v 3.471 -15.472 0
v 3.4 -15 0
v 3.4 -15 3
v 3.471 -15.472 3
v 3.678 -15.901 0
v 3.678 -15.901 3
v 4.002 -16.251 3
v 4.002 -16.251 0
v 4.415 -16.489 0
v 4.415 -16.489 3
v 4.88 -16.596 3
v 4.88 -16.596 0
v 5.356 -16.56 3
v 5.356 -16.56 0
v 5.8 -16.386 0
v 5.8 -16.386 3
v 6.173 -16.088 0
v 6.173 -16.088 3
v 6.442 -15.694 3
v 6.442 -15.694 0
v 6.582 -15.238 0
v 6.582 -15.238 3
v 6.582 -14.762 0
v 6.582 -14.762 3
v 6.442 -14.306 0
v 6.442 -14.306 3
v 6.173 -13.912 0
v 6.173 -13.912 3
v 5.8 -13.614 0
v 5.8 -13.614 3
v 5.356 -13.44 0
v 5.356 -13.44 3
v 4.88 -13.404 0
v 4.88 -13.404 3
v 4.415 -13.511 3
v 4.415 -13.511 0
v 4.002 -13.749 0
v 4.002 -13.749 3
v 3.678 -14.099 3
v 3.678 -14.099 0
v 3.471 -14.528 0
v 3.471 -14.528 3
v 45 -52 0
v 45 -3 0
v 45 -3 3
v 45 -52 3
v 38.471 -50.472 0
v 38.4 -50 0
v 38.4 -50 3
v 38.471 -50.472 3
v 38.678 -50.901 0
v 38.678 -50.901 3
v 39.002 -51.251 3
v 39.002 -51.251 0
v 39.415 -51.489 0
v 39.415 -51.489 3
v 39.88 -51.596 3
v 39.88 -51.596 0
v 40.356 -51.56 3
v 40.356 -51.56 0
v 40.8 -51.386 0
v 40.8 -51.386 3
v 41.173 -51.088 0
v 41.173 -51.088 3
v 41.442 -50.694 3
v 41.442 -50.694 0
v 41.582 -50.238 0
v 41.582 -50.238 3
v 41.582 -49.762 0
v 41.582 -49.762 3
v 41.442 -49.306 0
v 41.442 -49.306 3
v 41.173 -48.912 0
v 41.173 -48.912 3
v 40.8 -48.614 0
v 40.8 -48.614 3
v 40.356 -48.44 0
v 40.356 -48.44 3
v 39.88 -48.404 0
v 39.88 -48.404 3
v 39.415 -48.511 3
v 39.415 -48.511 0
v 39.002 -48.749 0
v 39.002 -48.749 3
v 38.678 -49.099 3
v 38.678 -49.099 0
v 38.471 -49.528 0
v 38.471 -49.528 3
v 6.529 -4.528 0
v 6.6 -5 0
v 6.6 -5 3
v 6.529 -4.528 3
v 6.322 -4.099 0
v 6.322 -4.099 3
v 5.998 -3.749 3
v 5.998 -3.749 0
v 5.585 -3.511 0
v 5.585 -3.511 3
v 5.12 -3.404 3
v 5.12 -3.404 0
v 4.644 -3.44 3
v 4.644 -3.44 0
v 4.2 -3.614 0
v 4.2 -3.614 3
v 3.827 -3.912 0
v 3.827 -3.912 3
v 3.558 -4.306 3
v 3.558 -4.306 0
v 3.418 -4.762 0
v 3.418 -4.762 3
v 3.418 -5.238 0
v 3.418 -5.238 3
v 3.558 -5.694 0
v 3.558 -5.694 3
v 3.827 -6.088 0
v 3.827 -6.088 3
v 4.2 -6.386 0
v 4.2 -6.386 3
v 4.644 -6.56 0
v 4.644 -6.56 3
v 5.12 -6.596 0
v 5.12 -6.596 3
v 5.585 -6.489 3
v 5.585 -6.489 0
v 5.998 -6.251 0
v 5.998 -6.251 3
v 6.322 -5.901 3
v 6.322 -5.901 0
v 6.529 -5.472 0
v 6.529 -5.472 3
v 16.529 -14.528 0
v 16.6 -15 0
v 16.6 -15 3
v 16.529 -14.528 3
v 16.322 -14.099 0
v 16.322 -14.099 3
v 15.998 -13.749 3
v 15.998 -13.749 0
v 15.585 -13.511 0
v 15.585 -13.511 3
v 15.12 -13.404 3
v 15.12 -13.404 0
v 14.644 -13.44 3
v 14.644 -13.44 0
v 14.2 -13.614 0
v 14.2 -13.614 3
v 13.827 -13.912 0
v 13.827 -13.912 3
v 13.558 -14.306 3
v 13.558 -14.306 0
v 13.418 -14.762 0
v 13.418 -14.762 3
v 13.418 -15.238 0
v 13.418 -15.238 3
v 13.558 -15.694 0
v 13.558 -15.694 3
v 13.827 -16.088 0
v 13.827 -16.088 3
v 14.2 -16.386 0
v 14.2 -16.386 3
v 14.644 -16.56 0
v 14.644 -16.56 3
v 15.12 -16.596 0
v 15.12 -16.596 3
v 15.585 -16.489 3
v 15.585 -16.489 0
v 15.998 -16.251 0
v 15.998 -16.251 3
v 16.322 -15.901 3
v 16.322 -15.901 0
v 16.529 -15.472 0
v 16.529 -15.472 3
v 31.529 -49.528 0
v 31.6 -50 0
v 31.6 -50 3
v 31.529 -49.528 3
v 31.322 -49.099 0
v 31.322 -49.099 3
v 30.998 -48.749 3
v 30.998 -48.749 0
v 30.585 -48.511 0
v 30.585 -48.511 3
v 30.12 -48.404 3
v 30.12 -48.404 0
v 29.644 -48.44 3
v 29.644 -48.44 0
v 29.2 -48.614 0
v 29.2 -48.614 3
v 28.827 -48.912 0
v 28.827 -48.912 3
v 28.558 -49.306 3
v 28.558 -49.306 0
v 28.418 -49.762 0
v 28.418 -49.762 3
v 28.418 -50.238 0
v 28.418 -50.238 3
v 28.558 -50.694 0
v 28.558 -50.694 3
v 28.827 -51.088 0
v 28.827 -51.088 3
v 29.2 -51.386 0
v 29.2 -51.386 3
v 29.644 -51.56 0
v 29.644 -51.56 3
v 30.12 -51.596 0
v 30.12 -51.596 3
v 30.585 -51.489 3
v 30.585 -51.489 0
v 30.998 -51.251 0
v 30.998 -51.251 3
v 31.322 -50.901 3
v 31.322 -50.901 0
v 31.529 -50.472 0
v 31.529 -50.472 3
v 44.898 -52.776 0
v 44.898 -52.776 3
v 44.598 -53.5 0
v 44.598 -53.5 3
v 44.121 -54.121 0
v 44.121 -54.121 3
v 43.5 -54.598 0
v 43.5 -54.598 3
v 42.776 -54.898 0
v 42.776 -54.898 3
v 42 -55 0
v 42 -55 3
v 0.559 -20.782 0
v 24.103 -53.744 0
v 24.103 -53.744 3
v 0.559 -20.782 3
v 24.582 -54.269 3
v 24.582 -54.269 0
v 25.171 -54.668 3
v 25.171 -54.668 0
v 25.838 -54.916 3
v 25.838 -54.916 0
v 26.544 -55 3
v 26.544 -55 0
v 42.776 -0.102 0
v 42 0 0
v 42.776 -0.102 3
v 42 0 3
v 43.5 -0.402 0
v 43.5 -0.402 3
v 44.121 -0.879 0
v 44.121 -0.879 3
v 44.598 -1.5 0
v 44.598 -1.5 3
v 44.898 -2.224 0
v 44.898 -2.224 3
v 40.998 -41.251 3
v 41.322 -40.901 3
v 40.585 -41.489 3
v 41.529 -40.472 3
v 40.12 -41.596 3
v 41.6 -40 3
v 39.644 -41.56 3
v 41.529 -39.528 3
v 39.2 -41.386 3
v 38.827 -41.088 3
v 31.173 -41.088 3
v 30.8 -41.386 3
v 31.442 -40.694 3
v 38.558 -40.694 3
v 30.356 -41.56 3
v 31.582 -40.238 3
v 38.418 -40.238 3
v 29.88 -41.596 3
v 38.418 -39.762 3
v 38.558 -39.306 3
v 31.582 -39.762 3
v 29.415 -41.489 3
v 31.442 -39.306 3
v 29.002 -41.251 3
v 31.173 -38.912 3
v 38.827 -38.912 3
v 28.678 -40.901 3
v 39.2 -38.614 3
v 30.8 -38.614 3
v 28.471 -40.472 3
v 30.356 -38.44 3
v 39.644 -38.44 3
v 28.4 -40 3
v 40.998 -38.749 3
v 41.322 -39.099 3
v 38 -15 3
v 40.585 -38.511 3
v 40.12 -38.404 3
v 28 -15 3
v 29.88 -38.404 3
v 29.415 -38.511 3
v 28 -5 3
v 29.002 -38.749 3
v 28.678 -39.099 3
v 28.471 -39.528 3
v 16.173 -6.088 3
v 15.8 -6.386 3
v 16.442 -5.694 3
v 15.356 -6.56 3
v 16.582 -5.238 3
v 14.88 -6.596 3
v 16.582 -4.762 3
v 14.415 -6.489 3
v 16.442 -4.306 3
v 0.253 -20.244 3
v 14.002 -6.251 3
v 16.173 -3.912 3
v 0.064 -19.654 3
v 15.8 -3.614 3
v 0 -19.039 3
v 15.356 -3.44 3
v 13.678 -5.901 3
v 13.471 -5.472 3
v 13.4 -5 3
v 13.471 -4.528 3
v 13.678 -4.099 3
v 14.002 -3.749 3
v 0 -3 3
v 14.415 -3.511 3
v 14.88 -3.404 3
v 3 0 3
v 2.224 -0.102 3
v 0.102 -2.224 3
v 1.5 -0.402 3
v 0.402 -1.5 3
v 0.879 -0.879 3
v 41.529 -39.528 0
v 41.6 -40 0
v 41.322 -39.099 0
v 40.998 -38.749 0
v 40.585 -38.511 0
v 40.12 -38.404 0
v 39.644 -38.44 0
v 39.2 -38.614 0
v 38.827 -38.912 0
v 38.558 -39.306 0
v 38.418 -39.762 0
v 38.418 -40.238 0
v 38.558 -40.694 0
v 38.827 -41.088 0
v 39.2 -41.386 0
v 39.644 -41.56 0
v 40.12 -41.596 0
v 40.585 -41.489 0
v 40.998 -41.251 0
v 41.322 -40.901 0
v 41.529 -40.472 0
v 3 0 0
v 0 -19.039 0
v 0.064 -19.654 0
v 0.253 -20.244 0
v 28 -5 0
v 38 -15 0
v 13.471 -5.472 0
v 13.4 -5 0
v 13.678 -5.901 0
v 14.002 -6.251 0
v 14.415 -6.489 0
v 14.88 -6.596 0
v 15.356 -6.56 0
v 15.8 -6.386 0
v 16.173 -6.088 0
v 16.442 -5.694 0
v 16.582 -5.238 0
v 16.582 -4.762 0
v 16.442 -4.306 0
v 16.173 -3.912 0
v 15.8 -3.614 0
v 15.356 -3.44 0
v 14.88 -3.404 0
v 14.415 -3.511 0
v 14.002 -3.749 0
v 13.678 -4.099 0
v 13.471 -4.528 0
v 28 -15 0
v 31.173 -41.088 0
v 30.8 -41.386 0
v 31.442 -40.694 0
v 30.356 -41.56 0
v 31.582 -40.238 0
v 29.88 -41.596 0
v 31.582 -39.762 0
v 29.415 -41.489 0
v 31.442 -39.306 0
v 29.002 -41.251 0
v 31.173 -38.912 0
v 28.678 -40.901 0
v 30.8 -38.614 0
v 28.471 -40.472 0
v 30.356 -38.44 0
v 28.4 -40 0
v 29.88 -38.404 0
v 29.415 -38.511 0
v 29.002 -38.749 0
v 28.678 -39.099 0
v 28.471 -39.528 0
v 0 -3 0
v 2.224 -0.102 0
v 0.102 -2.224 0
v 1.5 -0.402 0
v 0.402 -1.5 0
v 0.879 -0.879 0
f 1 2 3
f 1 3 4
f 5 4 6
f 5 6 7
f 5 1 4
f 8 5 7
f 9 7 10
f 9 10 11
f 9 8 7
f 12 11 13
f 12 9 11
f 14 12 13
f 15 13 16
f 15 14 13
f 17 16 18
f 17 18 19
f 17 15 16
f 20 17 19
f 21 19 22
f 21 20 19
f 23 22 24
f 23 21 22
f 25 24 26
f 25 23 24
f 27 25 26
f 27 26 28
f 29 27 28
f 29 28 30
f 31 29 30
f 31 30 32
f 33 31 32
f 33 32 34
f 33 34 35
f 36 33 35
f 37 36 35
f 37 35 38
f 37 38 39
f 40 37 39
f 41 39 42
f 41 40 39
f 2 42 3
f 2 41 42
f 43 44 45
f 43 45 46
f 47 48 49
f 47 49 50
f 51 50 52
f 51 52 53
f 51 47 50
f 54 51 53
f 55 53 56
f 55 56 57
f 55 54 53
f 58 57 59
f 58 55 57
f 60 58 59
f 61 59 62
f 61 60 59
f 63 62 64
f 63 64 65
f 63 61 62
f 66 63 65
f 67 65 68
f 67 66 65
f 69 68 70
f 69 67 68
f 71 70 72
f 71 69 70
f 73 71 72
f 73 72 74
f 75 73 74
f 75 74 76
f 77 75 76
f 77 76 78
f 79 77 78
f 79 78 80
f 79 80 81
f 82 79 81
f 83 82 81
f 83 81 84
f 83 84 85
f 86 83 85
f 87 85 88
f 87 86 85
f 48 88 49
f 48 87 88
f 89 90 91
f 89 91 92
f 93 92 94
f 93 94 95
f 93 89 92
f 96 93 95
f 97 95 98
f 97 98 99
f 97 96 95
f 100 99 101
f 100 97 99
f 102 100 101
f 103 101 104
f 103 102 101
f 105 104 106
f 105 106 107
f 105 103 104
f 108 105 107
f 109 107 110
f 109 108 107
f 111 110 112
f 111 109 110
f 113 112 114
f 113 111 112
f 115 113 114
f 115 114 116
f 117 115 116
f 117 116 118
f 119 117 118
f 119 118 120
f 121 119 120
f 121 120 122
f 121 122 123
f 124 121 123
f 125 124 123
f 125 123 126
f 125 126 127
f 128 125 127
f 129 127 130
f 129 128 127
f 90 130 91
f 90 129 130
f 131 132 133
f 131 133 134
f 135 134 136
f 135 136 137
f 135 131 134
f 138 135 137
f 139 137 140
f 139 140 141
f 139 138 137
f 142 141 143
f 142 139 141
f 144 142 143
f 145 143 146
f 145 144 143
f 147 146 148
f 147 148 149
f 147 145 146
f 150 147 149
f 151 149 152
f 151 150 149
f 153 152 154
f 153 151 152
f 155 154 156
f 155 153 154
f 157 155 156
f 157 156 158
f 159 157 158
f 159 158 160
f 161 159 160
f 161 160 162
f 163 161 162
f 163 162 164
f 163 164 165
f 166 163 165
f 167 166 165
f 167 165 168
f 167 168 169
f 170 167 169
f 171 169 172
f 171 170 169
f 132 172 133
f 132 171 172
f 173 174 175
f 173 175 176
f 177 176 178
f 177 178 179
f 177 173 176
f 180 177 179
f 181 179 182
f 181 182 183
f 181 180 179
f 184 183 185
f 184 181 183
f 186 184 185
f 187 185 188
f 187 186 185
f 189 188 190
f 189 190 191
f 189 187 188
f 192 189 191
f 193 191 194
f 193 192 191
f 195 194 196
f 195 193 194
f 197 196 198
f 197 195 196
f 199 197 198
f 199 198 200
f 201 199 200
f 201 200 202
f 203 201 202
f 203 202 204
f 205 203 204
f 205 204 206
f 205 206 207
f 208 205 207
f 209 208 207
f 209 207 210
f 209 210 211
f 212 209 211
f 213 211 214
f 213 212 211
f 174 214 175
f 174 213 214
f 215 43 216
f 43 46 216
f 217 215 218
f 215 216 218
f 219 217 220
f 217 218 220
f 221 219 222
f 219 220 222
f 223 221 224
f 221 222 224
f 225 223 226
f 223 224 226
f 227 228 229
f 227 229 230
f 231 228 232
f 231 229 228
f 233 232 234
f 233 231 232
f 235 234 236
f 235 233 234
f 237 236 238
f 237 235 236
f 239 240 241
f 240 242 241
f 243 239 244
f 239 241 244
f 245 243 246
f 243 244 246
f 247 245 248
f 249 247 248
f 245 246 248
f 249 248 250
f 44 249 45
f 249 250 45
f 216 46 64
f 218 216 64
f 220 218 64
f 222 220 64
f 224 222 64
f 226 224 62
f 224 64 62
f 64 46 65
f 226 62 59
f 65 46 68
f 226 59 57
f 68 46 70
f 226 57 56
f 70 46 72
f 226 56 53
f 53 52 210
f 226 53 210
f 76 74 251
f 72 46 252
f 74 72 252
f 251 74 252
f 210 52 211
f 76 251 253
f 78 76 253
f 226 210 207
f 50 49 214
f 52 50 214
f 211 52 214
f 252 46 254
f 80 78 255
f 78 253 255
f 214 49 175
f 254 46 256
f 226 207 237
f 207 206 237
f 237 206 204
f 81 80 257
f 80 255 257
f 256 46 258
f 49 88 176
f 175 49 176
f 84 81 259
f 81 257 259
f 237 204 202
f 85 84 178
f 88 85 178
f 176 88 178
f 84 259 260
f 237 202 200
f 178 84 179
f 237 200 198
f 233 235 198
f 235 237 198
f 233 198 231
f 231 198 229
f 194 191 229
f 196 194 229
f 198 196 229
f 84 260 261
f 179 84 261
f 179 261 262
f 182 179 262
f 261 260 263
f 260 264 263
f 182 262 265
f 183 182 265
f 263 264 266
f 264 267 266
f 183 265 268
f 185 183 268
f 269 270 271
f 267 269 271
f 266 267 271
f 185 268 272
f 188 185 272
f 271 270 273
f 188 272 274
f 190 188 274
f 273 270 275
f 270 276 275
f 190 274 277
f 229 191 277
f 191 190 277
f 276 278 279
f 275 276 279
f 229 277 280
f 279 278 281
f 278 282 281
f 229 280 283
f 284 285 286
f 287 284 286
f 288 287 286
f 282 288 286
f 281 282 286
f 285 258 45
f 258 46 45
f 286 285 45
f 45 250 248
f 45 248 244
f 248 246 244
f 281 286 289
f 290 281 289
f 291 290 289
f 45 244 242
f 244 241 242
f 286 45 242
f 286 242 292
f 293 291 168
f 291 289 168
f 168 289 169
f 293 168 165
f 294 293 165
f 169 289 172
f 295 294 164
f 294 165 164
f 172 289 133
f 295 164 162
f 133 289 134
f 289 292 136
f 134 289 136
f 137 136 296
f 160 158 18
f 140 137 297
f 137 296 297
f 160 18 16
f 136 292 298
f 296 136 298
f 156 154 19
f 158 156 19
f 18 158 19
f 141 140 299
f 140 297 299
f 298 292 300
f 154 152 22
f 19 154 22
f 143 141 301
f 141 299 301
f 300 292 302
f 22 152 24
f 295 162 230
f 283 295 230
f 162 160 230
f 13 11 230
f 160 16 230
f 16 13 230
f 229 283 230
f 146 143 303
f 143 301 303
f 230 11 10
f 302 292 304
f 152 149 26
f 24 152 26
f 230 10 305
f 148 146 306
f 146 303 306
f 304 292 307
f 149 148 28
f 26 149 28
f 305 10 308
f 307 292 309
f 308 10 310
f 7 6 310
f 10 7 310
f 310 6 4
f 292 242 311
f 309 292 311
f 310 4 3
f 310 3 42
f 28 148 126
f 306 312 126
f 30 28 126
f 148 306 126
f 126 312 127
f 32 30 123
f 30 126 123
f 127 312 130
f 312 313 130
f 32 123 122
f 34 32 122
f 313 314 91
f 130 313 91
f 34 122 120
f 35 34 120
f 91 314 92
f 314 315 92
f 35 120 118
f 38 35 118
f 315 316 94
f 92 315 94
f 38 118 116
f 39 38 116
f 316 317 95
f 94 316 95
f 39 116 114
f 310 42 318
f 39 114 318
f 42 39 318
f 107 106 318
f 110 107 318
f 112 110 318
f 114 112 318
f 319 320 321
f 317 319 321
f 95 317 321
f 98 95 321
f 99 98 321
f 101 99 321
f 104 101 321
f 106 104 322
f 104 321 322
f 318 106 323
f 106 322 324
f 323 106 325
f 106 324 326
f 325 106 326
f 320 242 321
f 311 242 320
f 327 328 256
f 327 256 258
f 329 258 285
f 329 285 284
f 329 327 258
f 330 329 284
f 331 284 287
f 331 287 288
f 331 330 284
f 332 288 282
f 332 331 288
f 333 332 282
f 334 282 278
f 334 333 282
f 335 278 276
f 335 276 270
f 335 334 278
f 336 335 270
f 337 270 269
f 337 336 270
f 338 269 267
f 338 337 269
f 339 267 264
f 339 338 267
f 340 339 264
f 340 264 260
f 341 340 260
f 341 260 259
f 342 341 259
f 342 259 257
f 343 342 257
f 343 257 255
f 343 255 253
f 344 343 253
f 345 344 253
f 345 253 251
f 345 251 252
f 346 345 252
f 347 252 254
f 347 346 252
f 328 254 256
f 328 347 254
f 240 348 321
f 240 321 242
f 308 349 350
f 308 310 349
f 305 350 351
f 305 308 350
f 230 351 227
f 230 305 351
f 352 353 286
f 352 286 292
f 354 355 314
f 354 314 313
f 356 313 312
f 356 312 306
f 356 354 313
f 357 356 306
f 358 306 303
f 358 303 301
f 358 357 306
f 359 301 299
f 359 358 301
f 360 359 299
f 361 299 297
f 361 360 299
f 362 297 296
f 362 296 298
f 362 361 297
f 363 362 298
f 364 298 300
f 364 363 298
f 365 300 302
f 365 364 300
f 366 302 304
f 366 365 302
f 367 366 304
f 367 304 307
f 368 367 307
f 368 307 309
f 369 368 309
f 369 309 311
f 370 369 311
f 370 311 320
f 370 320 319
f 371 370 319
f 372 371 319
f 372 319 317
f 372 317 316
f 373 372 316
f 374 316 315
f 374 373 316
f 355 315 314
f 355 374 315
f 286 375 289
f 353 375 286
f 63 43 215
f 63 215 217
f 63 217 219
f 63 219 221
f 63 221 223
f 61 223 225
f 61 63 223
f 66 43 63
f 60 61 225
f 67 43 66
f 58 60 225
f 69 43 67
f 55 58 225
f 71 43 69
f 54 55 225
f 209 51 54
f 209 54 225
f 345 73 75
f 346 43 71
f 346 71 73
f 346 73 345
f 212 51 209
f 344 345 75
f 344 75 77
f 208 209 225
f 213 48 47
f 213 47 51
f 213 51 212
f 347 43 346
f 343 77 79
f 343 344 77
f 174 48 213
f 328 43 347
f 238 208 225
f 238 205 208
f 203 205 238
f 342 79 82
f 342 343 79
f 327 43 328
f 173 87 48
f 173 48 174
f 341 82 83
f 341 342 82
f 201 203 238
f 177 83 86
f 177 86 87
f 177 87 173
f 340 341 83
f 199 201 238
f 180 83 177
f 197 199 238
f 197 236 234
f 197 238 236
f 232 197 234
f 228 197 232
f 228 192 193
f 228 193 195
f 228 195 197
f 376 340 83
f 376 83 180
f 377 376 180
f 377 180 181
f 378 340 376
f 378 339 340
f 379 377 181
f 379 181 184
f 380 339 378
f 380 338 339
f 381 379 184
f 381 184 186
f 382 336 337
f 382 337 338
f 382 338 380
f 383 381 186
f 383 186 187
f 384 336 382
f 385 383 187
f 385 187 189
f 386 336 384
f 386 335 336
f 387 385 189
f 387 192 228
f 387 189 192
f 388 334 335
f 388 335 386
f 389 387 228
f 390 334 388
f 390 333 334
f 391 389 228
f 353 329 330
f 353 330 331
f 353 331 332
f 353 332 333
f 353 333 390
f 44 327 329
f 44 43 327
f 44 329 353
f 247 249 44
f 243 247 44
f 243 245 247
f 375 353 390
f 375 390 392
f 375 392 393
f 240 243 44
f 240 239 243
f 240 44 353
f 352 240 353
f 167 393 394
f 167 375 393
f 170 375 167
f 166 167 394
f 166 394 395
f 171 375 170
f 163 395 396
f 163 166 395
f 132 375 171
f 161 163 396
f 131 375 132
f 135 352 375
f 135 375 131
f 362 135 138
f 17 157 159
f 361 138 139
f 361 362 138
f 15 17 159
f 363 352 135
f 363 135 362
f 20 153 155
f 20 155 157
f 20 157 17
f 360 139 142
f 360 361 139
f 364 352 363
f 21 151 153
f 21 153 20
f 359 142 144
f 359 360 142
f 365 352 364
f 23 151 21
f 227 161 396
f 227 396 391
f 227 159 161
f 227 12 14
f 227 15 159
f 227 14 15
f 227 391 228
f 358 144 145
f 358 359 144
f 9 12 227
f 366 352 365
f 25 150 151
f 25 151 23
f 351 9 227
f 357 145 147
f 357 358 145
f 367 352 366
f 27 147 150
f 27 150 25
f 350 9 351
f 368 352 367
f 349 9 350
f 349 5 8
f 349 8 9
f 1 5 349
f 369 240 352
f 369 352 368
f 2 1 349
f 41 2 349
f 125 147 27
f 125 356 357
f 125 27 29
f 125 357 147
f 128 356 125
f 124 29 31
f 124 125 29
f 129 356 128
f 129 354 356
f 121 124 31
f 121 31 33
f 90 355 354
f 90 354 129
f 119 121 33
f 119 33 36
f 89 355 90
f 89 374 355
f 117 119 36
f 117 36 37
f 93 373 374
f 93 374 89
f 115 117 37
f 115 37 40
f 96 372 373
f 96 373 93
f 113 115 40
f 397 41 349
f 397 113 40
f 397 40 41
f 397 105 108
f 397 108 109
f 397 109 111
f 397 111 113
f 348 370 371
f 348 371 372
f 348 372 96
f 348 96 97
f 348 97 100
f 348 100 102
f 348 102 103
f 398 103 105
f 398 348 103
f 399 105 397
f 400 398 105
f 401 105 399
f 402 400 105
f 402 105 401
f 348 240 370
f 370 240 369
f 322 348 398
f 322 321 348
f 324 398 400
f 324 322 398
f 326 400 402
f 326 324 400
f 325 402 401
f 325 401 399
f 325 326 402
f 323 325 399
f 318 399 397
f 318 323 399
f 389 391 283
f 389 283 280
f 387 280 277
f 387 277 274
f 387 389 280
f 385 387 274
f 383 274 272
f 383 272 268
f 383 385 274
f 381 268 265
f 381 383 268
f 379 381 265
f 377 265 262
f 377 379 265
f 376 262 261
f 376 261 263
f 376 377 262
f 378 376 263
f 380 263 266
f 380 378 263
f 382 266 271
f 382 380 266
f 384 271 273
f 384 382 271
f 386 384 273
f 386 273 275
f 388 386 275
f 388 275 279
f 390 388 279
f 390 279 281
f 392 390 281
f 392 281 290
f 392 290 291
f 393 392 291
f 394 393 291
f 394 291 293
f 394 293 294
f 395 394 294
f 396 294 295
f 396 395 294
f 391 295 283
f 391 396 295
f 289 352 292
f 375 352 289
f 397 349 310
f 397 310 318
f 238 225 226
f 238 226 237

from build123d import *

# Parameters (mm, degrees)
SKETCH_1_R      = 1.6
EXTRUDE_1_DEPTH = 3
FILLET_1_R      = 3


with BuildPart() as part:
    # 草图1 → 凸台-拉伸1 (new body)
    with BuildSketch(Plane.XY):
        Polygon((0, 0), (45, 0), (45, -55), (25, -55), (0, -20), align=None)
        with Locations((5, -5)):
            Circle(SKETCH_1_R, mode=Mode.SUBTRACT)
        with Locations(Location((15, -5, 0), (0, 0, 180))):
            Circle(SKETCH_1_R, mode=Mode.SUBTRACT)
        with Locations((15, -15)):
            Circle(SKETCH_1_R, mode=Mode.SUBTRACT)
        with Locations(Location((5, -15, 0), (0, 0, 180))):
            Circle(SKETCH_1_R, mode=Mode.SUBTRACT)
        with Locations((30, -50)):
            Circle(SKETCH_1_R, mode=Mode.SUBTRACT)
        with Locations(Location((40, -50, 0), (0, 0, 180))):
            Circle(SKETCH_1_R, mode=Mode.SUBTRACT)
        with Locations((40, -40)):
            Circle(SKETCH_1_R, mode=Mode.SUBTRACT)
        with Locations(Location((30, -40, 0), (0, 0, 180))):
            Circle(SKETCH_1_R, mode=Mode.SUBTRACT)
        Polygon((28, -5), (28, -15), (38, -15), align=None, mode=Mode.SUBTRACT)
    extrude(amount=EXTRUDE_1_DEPTH)

    # 圆角1
    fillet_1_edges = [part.edges().sort_by_distance(p)[0] for p in [
        (0, 0, 1.5),
        (45, 0, 1.5),
        (45, -55, 1.5),
        (25, -55, 1.5),
        (0, -20, 1.5),
    ]]
    fillet(fillet_1_edges, radius=FILLET_1_R)


solid = part.part
